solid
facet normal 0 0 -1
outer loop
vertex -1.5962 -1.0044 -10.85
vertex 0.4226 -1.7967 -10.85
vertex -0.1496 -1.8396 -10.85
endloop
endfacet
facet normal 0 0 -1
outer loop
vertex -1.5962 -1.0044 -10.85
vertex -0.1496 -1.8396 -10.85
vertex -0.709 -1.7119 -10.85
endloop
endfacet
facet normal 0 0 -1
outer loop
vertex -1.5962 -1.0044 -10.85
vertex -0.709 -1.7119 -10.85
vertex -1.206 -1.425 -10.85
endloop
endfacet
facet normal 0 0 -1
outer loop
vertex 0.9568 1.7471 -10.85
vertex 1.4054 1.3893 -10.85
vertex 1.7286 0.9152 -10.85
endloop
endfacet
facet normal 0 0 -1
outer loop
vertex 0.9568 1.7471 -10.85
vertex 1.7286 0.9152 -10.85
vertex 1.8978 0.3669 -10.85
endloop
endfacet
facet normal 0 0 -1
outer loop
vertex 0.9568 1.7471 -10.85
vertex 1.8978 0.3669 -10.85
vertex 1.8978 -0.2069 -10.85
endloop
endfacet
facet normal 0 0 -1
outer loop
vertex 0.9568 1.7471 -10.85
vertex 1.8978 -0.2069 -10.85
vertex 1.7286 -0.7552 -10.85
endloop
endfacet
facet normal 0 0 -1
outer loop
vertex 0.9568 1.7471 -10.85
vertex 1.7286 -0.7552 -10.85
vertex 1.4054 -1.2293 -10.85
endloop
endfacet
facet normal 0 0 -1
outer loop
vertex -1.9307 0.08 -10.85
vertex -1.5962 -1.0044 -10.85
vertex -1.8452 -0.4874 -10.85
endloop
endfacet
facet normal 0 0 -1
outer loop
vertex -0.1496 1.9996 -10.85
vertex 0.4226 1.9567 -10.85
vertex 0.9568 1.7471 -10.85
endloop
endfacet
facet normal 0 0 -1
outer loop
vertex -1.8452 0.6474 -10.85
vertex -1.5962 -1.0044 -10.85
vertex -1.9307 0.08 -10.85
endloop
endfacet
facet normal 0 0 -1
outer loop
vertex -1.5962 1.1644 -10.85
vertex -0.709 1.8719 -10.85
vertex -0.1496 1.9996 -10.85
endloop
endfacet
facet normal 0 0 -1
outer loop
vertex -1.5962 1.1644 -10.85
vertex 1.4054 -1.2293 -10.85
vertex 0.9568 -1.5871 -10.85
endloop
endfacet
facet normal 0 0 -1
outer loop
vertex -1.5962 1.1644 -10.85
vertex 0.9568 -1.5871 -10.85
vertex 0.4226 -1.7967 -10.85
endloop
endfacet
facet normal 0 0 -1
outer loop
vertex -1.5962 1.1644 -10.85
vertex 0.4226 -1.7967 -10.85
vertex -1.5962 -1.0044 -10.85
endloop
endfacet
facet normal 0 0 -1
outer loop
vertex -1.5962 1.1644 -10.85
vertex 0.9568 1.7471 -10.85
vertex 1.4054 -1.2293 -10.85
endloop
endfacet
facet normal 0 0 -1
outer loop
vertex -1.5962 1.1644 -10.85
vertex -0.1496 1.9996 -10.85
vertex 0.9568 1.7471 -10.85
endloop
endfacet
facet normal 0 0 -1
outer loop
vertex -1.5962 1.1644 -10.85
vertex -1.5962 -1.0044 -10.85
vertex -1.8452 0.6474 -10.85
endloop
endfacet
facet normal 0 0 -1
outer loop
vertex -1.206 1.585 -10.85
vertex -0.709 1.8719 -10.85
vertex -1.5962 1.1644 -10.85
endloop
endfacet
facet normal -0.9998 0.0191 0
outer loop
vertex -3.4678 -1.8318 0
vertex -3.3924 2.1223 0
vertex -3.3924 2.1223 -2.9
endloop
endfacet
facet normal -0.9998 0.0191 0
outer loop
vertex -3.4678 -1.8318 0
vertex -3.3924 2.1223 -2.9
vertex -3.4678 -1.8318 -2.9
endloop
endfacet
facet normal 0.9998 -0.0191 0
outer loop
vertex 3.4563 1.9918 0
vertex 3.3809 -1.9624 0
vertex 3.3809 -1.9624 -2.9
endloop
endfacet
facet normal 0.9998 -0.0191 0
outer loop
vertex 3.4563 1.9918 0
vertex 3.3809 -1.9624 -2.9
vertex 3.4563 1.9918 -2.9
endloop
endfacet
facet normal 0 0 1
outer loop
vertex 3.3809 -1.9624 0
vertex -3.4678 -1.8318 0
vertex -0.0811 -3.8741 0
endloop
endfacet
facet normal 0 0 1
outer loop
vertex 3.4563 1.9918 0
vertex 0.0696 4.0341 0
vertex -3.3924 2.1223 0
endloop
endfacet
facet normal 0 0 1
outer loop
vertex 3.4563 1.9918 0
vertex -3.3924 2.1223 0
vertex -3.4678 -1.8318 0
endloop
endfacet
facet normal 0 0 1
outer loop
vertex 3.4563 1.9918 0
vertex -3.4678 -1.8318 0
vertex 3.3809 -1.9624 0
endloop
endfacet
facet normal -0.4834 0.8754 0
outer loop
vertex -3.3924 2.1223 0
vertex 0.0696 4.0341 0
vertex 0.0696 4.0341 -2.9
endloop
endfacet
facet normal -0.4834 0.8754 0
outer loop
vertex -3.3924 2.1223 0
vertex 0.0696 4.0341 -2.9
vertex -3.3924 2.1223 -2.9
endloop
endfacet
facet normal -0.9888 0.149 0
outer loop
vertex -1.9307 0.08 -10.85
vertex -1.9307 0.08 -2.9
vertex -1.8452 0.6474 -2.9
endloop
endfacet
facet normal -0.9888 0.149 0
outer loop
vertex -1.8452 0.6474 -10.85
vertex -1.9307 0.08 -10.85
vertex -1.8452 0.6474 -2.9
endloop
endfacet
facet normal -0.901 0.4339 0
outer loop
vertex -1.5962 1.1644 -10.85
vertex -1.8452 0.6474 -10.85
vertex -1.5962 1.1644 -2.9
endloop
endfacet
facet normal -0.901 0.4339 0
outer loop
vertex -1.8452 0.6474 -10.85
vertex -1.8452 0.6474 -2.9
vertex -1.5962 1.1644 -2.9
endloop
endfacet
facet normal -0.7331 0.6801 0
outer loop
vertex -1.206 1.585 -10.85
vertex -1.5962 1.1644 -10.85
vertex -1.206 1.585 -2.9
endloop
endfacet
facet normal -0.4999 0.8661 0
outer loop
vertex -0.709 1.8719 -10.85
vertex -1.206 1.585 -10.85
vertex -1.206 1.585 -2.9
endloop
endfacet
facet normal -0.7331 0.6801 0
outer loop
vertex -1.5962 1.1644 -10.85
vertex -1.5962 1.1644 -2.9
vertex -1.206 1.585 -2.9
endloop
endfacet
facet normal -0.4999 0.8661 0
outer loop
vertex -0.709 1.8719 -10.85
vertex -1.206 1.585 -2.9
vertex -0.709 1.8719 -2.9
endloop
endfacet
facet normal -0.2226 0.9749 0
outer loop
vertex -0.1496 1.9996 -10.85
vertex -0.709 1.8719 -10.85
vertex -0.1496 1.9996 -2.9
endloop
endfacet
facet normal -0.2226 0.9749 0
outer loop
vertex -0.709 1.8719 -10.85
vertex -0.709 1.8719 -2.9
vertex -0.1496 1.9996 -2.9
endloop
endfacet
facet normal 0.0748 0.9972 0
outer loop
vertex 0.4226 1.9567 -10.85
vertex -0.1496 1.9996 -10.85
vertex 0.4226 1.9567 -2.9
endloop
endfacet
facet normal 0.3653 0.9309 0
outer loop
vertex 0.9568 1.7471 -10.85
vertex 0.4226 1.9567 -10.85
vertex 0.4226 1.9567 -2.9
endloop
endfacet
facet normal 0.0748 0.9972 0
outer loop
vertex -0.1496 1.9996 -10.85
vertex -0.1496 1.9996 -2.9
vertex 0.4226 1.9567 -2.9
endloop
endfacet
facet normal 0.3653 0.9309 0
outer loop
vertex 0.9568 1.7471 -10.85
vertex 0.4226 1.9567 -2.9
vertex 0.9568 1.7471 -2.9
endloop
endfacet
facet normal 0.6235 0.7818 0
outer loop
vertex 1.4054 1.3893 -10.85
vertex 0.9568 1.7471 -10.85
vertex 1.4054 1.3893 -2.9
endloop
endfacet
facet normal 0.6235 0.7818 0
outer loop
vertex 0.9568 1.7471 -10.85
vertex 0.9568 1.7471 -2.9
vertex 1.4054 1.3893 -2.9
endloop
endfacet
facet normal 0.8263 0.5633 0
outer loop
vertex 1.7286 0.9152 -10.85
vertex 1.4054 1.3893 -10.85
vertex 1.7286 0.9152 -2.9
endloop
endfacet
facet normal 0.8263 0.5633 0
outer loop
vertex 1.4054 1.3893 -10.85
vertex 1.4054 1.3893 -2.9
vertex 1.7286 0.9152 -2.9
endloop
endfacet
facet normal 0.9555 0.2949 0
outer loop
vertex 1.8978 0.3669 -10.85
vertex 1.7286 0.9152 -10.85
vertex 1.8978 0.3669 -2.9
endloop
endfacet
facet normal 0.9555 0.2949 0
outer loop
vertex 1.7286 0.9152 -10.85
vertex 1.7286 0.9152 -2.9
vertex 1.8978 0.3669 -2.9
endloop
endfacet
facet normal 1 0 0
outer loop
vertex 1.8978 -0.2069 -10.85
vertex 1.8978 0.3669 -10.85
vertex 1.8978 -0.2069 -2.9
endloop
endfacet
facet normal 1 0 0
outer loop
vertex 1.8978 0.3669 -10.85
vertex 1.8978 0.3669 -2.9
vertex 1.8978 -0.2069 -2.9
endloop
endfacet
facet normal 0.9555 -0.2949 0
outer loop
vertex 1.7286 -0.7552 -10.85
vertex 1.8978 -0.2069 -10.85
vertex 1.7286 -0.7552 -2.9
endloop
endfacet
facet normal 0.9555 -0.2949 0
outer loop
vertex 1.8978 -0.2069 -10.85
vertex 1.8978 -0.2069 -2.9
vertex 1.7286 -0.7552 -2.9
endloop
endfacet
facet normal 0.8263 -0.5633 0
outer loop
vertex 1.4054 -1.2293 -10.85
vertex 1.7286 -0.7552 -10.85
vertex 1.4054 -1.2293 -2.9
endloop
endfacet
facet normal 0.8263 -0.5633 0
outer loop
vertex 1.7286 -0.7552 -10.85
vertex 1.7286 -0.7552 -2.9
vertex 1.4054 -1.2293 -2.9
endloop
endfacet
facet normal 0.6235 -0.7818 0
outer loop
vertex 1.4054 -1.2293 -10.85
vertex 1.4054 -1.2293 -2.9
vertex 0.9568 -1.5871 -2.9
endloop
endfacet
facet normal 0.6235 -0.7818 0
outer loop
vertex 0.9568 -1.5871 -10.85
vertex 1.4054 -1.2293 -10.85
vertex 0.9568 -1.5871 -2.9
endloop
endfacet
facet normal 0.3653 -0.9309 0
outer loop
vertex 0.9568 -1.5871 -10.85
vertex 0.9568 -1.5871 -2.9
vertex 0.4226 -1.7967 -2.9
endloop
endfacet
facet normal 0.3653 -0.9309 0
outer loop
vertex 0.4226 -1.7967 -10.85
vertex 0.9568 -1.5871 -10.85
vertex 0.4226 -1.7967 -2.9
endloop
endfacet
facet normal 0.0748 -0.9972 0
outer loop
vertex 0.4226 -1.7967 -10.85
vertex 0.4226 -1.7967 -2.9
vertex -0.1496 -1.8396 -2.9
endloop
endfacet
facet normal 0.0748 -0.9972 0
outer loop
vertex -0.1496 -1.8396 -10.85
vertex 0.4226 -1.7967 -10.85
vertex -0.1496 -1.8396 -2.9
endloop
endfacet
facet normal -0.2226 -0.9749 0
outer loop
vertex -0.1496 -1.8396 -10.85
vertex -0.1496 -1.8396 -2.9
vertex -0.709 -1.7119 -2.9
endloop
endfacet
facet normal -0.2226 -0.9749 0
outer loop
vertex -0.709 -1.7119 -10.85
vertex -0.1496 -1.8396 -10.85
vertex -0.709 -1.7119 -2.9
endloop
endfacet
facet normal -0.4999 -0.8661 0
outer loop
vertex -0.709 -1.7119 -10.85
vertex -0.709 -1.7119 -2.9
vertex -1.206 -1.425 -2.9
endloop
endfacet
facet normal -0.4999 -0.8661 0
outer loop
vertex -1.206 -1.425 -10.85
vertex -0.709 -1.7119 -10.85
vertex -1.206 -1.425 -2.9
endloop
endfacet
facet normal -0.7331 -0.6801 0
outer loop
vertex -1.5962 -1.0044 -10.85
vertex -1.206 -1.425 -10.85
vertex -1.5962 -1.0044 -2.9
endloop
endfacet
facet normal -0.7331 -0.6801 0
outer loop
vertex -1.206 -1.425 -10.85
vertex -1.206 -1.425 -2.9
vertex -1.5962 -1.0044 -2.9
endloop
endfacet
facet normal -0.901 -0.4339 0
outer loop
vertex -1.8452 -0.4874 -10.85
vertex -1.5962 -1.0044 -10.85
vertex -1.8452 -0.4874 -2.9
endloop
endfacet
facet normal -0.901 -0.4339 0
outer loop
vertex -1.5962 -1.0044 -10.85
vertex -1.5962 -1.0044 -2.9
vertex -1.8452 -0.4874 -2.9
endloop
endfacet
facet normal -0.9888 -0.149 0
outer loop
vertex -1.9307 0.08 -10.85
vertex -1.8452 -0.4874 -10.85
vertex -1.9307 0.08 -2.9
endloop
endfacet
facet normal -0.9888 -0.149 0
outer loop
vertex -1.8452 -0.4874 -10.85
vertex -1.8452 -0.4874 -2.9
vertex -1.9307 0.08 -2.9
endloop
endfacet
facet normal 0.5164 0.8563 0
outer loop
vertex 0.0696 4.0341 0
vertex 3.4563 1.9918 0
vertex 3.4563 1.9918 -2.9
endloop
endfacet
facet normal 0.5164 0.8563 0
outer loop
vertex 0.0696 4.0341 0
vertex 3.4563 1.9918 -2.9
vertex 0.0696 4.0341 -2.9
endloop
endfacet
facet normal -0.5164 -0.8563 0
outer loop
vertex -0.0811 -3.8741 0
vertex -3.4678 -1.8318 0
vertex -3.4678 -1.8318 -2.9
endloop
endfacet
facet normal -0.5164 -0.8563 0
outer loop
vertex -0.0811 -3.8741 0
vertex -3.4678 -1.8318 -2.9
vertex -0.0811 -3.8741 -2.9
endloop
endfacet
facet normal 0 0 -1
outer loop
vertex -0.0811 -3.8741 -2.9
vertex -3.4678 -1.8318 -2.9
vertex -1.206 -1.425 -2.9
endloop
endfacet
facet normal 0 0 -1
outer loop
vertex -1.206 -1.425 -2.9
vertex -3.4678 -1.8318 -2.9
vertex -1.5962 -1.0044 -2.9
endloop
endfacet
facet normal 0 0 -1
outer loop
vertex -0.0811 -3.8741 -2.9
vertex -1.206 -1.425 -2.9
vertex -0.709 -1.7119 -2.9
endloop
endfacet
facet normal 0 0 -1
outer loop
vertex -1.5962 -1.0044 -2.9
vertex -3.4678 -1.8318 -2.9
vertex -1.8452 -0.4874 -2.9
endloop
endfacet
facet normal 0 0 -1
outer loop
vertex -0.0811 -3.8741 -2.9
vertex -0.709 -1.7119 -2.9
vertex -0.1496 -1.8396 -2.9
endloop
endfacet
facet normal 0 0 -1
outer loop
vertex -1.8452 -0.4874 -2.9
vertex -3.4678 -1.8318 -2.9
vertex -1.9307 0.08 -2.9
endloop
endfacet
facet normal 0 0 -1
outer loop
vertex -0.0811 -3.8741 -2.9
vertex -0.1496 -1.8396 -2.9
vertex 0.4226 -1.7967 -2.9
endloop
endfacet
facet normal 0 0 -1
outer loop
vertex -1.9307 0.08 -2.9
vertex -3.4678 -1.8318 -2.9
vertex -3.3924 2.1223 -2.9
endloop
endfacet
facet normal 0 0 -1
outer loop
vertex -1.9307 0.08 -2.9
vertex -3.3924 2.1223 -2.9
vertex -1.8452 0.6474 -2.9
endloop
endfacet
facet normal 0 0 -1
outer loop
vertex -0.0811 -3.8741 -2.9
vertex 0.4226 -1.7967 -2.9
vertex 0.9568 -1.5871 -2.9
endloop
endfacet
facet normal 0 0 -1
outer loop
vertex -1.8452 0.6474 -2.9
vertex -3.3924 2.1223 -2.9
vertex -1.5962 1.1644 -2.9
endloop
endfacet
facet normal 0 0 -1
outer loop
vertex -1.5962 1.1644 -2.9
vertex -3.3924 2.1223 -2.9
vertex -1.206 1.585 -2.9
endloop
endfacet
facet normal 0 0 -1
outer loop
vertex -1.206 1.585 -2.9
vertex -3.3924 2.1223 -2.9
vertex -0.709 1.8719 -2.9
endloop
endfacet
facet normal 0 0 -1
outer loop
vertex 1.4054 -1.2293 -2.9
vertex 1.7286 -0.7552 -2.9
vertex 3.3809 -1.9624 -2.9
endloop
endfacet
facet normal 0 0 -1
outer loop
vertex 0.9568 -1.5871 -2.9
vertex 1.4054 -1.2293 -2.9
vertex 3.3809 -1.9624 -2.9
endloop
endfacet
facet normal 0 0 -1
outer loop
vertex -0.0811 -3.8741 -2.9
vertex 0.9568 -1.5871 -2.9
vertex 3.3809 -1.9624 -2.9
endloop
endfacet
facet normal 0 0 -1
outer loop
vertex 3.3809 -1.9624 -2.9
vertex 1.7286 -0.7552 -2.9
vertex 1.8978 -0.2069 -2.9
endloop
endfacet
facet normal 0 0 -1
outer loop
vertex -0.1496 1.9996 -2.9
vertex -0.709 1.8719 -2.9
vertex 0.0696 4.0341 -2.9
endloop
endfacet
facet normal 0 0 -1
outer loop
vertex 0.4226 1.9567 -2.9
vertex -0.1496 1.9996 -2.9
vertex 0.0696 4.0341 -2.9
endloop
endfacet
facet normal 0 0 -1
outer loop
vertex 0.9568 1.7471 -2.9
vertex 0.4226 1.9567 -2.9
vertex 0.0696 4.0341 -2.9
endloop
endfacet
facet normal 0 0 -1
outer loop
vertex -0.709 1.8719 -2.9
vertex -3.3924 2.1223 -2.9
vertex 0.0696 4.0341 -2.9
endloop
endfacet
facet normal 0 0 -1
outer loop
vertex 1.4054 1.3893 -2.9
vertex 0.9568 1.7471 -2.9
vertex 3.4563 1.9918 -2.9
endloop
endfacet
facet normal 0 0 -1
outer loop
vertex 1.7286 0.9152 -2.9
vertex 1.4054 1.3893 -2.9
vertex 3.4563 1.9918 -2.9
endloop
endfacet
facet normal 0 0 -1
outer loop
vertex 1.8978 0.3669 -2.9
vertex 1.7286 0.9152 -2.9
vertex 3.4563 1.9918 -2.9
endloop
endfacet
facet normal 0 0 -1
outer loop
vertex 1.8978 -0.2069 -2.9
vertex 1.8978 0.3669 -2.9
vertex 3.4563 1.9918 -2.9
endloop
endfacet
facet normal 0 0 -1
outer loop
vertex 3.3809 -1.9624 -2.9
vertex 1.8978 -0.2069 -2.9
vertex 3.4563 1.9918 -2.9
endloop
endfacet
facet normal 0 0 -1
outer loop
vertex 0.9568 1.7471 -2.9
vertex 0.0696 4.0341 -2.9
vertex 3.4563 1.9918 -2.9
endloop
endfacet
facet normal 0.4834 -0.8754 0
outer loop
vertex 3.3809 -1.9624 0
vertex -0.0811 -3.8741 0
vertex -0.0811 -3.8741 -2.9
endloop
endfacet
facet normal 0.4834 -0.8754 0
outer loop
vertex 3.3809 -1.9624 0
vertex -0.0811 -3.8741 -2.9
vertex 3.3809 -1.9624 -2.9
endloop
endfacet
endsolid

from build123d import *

# Parameters (mm, degrees)
EXTRUDE_1_DEPTH = 2.9
SKETCH_4_R      = 1.925
EXTRUDE_2_DEPTH = 7.95


with BuildPart() as part:
    # Эскиз1 → Бобышка-Вытянуть1 (new body)
    with BuildSketch(Plane.XY):
        Polygon((3.380947783, -1.962353809), (3.456334009, 1.991776974), (0.069649414, 4.034128753), (-3.392421407, 2.122349748), (-3.467807633, -1.831781035), (-0.081123038, -3.874132814), align=None)
    extrude(amount=-EXTRUDE_1_DEPTH)

    # Эскиз4 → Бобышка-Вытянуть2 (add)
    with BuildSketch(Plane(origin=(0, 0, -2.9), x_dir=(-1, 0, 0), z_dir=(0, 0, -1))):
        with Locations((0.005736812, 0.07999797)):
            Circle(SKETCH_4_R)
    extrude(amount=EXTRUDE_2_DEPTH)


solid = part.part
